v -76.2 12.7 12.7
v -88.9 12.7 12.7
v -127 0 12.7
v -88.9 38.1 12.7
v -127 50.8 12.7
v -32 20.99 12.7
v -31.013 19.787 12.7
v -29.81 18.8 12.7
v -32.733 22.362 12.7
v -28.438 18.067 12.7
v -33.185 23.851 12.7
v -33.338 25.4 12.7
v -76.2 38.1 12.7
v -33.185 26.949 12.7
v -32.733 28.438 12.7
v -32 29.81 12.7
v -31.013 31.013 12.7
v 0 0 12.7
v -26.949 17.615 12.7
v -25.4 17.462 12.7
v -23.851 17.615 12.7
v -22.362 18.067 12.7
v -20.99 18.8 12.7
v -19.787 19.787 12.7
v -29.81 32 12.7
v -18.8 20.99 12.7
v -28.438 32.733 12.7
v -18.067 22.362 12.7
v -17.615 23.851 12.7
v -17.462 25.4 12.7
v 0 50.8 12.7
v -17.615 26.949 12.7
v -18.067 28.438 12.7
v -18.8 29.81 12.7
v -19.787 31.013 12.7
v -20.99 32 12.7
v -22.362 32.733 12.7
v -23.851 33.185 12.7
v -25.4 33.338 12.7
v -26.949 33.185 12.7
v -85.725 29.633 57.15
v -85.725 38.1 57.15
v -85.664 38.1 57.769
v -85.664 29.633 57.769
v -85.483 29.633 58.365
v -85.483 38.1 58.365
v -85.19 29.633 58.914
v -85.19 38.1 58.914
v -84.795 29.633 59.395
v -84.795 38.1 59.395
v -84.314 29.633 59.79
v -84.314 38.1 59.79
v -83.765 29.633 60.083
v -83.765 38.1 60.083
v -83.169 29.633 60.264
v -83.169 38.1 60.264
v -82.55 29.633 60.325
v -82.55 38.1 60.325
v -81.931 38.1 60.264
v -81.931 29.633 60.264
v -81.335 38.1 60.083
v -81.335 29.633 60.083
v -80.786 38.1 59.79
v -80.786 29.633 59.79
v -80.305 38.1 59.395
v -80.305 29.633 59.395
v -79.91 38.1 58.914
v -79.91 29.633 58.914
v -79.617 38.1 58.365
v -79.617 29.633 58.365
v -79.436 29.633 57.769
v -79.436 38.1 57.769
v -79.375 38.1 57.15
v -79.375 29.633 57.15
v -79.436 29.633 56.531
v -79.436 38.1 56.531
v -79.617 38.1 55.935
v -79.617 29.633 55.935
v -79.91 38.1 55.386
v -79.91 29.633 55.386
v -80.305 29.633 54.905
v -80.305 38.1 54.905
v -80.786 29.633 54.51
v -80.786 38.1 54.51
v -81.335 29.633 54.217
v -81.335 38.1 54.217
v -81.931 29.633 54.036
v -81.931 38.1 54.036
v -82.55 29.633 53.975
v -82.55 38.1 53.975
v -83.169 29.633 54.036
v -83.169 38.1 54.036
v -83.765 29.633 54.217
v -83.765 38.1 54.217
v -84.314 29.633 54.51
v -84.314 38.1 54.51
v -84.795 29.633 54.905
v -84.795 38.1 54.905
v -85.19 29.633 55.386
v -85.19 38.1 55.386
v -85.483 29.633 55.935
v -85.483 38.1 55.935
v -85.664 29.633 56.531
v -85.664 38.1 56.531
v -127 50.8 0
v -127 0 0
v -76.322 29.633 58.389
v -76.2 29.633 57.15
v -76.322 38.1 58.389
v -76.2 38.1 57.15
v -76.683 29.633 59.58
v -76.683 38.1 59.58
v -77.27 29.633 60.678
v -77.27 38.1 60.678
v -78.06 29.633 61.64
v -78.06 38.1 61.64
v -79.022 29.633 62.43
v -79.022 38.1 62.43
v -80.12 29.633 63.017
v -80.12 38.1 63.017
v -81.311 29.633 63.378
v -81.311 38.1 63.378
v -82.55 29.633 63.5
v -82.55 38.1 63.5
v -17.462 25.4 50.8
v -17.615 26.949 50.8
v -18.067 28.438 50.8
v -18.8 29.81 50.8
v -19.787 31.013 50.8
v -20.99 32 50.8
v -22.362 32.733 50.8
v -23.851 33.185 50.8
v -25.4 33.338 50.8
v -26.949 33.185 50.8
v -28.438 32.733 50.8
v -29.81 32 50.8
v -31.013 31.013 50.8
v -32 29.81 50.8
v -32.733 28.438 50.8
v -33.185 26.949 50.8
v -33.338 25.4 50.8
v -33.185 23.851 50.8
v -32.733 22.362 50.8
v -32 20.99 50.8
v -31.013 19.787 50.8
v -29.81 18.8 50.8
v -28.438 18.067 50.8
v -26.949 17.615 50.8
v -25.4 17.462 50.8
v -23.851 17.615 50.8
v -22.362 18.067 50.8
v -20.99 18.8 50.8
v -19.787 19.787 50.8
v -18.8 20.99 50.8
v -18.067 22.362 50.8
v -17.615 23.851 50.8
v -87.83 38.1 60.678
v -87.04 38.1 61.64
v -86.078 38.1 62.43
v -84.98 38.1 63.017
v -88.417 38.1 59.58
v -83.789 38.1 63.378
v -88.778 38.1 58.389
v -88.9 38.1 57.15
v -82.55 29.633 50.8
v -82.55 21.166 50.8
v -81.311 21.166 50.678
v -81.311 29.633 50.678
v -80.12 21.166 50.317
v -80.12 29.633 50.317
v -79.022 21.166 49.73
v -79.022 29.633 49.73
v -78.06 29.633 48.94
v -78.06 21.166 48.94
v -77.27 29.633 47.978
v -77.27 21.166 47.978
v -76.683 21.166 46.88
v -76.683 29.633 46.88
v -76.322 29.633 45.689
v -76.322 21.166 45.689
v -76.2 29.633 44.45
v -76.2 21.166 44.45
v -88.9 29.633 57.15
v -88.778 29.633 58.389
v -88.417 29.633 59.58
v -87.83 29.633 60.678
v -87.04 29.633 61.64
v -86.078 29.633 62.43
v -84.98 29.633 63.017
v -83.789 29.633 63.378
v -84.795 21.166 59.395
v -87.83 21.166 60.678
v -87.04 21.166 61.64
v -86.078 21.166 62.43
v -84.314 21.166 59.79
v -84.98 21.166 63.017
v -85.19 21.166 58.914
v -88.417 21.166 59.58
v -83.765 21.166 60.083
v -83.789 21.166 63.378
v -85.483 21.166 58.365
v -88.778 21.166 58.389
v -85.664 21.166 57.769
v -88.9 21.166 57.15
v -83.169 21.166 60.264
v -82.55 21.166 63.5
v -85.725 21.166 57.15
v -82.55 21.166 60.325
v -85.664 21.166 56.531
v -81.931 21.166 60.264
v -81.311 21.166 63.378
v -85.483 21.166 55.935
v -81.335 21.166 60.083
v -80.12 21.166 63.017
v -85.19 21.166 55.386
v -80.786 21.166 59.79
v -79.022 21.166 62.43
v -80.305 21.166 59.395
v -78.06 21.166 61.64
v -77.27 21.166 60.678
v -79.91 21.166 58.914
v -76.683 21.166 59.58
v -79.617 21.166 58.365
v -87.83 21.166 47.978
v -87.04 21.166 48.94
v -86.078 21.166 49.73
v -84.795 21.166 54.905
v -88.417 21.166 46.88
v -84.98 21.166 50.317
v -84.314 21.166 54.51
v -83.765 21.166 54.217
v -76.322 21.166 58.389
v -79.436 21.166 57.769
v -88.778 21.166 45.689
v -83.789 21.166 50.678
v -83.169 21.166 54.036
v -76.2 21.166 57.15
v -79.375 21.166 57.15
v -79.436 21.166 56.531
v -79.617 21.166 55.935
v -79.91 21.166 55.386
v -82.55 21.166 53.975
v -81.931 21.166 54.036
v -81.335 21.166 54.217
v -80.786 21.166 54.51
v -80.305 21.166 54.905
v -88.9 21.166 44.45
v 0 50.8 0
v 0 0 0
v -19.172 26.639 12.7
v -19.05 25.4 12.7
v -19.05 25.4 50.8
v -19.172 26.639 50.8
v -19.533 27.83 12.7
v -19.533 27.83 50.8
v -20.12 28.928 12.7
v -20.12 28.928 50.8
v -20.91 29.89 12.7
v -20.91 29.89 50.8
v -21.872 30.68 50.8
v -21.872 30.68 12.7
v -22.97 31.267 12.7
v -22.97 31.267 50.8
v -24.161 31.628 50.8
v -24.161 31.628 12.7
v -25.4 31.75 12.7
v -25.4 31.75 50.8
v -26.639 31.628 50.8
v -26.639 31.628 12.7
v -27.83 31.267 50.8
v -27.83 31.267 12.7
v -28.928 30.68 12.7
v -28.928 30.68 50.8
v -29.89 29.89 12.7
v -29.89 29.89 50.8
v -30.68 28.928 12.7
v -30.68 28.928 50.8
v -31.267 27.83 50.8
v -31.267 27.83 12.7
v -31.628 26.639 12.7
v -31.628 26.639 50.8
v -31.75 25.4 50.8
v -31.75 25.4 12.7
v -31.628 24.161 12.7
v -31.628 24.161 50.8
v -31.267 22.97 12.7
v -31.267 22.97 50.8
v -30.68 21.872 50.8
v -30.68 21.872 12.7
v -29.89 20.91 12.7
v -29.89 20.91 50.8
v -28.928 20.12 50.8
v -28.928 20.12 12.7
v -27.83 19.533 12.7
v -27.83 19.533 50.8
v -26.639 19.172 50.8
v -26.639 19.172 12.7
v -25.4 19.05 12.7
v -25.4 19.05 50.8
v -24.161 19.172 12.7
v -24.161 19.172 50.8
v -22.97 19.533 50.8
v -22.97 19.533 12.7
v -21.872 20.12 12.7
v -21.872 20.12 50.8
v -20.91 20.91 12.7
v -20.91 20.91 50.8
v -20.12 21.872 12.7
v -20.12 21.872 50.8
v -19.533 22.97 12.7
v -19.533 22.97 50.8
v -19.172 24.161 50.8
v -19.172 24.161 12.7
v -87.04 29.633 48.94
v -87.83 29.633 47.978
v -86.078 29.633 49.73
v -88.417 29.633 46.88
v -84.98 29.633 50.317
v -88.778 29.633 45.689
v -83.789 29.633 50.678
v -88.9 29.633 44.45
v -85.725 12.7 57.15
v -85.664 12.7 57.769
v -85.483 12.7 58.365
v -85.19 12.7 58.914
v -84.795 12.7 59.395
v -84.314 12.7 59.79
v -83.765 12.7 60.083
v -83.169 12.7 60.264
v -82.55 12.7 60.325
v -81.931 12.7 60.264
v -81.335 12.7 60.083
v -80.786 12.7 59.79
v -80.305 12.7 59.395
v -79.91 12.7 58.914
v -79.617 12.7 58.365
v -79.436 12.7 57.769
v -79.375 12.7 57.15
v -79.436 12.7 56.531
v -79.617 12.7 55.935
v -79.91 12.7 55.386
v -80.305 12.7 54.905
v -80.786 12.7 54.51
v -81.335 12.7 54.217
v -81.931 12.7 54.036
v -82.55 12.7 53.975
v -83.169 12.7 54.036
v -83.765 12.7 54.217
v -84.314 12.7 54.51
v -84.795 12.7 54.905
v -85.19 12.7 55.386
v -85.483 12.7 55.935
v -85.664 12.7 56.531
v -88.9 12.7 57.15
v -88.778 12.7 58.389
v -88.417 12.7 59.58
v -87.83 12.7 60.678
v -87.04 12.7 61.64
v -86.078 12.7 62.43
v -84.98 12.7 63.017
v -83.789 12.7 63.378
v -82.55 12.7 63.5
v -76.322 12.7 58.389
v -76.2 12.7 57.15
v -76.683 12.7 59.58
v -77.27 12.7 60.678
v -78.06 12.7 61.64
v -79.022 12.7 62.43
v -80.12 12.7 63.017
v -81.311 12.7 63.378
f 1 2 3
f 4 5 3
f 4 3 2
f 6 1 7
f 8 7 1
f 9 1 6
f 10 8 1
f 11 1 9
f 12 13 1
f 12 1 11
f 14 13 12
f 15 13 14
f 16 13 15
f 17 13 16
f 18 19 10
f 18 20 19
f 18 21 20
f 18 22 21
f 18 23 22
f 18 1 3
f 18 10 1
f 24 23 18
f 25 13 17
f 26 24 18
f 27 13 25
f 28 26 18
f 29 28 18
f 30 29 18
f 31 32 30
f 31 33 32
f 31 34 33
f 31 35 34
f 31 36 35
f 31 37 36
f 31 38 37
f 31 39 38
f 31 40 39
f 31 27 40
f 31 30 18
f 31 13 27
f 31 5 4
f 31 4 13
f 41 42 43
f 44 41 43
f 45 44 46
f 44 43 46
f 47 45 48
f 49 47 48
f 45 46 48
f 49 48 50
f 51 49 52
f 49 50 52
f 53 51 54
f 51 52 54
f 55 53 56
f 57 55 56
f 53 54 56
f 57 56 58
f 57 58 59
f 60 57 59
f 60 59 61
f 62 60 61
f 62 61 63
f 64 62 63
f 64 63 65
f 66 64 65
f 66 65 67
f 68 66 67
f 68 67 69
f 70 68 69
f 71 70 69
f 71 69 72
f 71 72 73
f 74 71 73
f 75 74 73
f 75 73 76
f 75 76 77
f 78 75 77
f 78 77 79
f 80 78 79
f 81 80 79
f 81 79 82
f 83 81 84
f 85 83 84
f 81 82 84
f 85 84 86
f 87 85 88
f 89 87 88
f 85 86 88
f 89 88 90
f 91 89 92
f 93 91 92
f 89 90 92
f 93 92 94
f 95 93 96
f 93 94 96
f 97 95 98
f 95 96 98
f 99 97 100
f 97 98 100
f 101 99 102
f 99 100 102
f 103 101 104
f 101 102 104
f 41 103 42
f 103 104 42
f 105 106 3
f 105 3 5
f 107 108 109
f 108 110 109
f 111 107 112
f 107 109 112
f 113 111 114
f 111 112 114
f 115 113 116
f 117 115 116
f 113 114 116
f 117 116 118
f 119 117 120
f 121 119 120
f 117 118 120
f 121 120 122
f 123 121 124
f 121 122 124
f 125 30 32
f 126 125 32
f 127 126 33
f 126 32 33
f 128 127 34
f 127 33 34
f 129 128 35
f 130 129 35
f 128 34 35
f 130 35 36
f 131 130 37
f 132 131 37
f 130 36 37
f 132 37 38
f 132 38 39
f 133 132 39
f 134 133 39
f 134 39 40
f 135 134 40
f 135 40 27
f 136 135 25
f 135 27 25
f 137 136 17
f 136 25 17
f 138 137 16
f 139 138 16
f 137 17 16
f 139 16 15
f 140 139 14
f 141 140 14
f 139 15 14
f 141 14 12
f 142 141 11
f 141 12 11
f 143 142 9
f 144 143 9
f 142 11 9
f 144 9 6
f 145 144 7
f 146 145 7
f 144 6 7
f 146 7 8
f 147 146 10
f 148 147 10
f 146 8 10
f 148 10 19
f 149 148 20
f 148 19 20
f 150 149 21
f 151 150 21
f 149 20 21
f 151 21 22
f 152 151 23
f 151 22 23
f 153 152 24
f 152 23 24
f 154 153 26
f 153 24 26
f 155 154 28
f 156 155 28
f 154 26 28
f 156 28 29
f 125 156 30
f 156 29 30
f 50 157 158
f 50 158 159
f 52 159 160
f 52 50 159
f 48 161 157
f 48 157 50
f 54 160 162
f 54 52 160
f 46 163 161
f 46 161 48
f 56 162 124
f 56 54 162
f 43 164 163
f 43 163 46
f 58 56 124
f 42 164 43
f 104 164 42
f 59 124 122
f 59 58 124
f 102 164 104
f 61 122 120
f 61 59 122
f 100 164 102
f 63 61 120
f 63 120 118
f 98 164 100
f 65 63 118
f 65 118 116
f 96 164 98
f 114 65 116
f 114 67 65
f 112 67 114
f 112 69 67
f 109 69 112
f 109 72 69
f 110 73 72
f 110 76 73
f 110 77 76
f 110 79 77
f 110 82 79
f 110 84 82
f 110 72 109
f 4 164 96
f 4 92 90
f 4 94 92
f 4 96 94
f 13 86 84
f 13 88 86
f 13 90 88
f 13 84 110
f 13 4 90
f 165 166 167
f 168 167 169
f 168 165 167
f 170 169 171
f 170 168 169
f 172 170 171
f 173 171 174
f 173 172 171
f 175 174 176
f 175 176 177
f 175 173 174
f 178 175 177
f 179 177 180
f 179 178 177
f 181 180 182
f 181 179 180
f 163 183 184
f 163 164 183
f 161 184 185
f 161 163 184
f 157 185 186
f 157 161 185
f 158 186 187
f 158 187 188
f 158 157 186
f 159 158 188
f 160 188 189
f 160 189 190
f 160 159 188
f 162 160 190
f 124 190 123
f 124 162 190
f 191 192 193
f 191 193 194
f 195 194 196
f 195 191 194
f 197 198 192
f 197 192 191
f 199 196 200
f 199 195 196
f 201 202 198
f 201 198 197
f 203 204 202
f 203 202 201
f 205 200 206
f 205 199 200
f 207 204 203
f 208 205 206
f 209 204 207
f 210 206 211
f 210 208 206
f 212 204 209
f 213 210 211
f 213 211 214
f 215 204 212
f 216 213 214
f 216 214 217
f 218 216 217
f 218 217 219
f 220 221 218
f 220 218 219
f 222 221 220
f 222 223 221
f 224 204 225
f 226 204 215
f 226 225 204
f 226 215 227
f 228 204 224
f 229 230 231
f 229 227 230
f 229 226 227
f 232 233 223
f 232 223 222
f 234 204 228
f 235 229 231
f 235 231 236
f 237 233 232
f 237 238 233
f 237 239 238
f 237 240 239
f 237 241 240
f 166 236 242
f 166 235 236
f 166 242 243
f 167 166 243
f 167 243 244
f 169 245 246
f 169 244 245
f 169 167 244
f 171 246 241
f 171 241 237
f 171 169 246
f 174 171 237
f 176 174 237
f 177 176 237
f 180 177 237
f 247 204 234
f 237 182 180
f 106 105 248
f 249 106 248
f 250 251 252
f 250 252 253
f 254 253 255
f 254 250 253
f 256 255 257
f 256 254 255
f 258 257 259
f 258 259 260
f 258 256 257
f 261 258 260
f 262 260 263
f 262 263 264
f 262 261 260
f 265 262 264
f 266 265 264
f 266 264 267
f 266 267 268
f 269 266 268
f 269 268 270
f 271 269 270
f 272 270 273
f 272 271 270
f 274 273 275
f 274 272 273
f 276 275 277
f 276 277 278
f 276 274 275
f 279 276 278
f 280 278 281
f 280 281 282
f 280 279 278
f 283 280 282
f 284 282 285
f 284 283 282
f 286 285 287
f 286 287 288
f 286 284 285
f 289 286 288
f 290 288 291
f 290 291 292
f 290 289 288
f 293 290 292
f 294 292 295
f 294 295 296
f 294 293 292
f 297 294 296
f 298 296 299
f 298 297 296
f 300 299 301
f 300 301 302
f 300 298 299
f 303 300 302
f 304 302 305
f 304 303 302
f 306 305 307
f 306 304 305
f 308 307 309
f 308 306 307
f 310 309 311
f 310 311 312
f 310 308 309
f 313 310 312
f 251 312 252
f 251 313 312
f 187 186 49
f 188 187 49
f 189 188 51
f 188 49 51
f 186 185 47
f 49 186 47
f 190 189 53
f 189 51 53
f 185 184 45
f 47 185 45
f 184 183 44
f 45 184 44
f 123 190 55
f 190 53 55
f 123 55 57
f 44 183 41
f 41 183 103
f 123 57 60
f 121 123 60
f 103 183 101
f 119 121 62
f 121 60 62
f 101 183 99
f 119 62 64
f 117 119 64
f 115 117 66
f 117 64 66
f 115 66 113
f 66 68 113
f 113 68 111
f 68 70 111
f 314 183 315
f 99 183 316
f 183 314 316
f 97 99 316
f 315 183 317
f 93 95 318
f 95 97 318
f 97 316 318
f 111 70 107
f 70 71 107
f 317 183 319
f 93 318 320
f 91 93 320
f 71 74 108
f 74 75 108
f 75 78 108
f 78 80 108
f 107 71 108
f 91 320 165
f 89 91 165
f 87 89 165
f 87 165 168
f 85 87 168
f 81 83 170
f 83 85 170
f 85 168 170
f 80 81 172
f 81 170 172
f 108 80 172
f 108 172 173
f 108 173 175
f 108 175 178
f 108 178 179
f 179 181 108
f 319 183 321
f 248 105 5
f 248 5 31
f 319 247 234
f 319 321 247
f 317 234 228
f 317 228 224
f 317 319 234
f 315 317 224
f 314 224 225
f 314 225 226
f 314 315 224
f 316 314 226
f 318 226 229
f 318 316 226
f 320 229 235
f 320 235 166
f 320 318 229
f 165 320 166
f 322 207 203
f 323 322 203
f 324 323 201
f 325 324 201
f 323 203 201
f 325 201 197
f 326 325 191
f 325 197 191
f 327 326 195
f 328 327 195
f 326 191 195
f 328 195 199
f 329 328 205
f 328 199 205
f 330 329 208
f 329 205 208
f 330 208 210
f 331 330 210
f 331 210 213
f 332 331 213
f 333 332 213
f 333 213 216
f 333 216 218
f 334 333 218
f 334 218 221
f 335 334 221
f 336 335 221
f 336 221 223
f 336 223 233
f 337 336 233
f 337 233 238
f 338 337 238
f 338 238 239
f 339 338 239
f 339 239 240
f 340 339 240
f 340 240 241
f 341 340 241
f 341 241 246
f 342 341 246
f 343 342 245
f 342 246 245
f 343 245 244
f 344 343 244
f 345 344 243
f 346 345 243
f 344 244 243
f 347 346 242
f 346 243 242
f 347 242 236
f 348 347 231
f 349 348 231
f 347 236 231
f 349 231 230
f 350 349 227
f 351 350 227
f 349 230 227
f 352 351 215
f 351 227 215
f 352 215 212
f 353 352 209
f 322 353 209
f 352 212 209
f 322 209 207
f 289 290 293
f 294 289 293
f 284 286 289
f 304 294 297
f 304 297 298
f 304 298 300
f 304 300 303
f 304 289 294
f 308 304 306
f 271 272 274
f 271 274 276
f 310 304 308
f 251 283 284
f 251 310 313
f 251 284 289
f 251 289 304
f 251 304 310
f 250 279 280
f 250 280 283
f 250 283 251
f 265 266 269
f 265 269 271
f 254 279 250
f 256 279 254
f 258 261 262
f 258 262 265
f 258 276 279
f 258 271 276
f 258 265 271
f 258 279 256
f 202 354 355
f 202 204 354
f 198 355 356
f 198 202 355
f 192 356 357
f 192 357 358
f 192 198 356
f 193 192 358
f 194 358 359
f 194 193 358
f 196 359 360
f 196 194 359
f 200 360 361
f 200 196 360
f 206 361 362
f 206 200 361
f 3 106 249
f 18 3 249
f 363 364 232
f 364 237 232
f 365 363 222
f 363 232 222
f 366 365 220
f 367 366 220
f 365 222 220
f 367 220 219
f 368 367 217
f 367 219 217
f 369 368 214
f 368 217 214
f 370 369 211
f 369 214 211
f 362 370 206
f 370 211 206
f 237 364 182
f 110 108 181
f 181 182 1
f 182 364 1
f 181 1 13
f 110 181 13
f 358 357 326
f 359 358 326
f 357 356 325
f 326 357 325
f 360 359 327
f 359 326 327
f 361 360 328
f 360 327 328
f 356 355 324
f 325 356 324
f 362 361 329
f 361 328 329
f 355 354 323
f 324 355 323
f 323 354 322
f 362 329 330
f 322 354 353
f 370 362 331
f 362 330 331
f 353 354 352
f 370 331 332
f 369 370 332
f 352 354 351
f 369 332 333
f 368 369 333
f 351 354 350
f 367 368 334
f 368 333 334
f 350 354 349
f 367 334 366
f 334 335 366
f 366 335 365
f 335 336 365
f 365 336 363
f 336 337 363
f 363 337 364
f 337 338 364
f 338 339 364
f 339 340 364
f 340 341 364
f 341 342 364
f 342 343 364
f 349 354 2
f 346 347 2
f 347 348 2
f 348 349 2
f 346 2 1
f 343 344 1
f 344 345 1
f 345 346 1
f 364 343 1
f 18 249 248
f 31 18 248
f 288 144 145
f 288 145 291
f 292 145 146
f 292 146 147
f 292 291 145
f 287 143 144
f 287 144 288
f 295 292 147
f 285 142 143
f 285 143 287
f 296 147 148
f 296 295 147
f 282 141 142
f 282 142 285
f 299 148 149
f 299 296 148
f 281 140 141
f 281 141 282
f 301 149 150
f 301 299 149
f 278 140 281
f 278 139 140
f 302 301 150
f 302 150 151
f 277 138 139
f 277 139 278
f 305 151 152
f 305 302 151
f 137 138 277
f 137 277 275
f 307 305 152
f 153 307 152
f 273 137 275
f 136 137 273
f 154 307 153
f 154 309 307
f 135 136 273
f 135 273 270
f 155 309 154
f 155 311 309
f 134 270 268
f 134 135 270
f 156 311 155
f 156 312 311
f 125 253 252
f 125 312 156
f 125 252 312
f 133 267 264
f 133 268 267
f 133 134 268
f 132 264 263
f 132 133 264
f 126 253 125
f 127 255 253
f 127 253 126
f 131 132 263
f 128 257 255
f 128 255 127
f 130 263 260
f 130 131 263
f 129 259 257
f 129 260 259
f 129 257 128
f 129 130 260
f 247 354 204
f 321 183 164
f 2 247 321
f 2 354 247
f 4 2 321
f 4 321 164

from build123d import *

# Parameters (mm, degrees)
F0_W     = 127
F0_H     = 50.8
F1_DEPTH = 12.7
F2_R     = 7.9375
F2_R_2   = 6.35
F2_W     = 12.7
F2_H     = 25.4
F3_DEPTH = 38.1
F4_W     = 12.7
F4_H     = 8.466582
F4_H_2   = 8.46582
F5_DEPTH = 12.7
F6_R     = 6.34999
F7_R     = 3.175
F8_DEPTH = 25.4


# Not quite as in the source:
# - a fillet or chamfer is up to 0.001 mm smaller than in the source, because OpenCascade refuses the exact size


with BuildPart() as f1:
    # F0 (on Top) → F1 (new body)
    with BuildSketch(Plane.XY):
        with Locations((-63.5, 25.4)):
            Rectangle(F0_W, F0_H)
    extrude(amount=F1_DEPTH)

    # F2 (on face) → F3 (join)
    with BuildSketch(Plane.XY.offset(12.7)):
        with Locations((-25.4, 25.4)):
            Circle(F2_R)
        with Locations((-25.4, 25.4)):
            Circle(F2_R_2, mode=Mode.SUBTRACT)
        with Locations((-82.55, 25.4)):
            Rectangle(F2_W, F2_H)
    extrude(amount=F3_DEPTH)

    # F4 (on face) → F5 (join)
    with BuildSketch(Plane.XY.offset(50.8)):
        with Locations((-82.55, 33.866709)):
            Rectangle(F4_W, F4_H)
        with Locations((-82.55, 16.93291)):
            Rectangle(F4_W, F4_H_2)
    extrude(amount=F5_DEPTH)

    # F6 (radius 6.35 in the source; OpenCascade refuses exactly that, so slightly less here)
    f6_edges = [f1.edges().sort_by_distance(p)[0] for p in [
        (-88.9, 33.866709, 63.5),
        (-88.9, 16.93291, 63.5),
        (-76.2, 33.866709, 63.5),
        (-76.2, 16.93291, 63.5),
        (-88.9, 25.399619, 50.8),
        (-76.2, 25.399619, 50.8),
    ]]
    fillet(f6_edges, radius=F6_R)

    # F7 (on face) → F8 (cut)
    with BuildSketch(Plane(origin=(0, 38.1, 0), x_dir=(-1, 0, 0), z_dir=(0, 1, 0))):
        with Locations((82.55, 57.15)):
            Circle(F7_R)
    extrude(amount=-F8_DEPTH, mode=Mode.SUBTRACT)


solid = f1.part
